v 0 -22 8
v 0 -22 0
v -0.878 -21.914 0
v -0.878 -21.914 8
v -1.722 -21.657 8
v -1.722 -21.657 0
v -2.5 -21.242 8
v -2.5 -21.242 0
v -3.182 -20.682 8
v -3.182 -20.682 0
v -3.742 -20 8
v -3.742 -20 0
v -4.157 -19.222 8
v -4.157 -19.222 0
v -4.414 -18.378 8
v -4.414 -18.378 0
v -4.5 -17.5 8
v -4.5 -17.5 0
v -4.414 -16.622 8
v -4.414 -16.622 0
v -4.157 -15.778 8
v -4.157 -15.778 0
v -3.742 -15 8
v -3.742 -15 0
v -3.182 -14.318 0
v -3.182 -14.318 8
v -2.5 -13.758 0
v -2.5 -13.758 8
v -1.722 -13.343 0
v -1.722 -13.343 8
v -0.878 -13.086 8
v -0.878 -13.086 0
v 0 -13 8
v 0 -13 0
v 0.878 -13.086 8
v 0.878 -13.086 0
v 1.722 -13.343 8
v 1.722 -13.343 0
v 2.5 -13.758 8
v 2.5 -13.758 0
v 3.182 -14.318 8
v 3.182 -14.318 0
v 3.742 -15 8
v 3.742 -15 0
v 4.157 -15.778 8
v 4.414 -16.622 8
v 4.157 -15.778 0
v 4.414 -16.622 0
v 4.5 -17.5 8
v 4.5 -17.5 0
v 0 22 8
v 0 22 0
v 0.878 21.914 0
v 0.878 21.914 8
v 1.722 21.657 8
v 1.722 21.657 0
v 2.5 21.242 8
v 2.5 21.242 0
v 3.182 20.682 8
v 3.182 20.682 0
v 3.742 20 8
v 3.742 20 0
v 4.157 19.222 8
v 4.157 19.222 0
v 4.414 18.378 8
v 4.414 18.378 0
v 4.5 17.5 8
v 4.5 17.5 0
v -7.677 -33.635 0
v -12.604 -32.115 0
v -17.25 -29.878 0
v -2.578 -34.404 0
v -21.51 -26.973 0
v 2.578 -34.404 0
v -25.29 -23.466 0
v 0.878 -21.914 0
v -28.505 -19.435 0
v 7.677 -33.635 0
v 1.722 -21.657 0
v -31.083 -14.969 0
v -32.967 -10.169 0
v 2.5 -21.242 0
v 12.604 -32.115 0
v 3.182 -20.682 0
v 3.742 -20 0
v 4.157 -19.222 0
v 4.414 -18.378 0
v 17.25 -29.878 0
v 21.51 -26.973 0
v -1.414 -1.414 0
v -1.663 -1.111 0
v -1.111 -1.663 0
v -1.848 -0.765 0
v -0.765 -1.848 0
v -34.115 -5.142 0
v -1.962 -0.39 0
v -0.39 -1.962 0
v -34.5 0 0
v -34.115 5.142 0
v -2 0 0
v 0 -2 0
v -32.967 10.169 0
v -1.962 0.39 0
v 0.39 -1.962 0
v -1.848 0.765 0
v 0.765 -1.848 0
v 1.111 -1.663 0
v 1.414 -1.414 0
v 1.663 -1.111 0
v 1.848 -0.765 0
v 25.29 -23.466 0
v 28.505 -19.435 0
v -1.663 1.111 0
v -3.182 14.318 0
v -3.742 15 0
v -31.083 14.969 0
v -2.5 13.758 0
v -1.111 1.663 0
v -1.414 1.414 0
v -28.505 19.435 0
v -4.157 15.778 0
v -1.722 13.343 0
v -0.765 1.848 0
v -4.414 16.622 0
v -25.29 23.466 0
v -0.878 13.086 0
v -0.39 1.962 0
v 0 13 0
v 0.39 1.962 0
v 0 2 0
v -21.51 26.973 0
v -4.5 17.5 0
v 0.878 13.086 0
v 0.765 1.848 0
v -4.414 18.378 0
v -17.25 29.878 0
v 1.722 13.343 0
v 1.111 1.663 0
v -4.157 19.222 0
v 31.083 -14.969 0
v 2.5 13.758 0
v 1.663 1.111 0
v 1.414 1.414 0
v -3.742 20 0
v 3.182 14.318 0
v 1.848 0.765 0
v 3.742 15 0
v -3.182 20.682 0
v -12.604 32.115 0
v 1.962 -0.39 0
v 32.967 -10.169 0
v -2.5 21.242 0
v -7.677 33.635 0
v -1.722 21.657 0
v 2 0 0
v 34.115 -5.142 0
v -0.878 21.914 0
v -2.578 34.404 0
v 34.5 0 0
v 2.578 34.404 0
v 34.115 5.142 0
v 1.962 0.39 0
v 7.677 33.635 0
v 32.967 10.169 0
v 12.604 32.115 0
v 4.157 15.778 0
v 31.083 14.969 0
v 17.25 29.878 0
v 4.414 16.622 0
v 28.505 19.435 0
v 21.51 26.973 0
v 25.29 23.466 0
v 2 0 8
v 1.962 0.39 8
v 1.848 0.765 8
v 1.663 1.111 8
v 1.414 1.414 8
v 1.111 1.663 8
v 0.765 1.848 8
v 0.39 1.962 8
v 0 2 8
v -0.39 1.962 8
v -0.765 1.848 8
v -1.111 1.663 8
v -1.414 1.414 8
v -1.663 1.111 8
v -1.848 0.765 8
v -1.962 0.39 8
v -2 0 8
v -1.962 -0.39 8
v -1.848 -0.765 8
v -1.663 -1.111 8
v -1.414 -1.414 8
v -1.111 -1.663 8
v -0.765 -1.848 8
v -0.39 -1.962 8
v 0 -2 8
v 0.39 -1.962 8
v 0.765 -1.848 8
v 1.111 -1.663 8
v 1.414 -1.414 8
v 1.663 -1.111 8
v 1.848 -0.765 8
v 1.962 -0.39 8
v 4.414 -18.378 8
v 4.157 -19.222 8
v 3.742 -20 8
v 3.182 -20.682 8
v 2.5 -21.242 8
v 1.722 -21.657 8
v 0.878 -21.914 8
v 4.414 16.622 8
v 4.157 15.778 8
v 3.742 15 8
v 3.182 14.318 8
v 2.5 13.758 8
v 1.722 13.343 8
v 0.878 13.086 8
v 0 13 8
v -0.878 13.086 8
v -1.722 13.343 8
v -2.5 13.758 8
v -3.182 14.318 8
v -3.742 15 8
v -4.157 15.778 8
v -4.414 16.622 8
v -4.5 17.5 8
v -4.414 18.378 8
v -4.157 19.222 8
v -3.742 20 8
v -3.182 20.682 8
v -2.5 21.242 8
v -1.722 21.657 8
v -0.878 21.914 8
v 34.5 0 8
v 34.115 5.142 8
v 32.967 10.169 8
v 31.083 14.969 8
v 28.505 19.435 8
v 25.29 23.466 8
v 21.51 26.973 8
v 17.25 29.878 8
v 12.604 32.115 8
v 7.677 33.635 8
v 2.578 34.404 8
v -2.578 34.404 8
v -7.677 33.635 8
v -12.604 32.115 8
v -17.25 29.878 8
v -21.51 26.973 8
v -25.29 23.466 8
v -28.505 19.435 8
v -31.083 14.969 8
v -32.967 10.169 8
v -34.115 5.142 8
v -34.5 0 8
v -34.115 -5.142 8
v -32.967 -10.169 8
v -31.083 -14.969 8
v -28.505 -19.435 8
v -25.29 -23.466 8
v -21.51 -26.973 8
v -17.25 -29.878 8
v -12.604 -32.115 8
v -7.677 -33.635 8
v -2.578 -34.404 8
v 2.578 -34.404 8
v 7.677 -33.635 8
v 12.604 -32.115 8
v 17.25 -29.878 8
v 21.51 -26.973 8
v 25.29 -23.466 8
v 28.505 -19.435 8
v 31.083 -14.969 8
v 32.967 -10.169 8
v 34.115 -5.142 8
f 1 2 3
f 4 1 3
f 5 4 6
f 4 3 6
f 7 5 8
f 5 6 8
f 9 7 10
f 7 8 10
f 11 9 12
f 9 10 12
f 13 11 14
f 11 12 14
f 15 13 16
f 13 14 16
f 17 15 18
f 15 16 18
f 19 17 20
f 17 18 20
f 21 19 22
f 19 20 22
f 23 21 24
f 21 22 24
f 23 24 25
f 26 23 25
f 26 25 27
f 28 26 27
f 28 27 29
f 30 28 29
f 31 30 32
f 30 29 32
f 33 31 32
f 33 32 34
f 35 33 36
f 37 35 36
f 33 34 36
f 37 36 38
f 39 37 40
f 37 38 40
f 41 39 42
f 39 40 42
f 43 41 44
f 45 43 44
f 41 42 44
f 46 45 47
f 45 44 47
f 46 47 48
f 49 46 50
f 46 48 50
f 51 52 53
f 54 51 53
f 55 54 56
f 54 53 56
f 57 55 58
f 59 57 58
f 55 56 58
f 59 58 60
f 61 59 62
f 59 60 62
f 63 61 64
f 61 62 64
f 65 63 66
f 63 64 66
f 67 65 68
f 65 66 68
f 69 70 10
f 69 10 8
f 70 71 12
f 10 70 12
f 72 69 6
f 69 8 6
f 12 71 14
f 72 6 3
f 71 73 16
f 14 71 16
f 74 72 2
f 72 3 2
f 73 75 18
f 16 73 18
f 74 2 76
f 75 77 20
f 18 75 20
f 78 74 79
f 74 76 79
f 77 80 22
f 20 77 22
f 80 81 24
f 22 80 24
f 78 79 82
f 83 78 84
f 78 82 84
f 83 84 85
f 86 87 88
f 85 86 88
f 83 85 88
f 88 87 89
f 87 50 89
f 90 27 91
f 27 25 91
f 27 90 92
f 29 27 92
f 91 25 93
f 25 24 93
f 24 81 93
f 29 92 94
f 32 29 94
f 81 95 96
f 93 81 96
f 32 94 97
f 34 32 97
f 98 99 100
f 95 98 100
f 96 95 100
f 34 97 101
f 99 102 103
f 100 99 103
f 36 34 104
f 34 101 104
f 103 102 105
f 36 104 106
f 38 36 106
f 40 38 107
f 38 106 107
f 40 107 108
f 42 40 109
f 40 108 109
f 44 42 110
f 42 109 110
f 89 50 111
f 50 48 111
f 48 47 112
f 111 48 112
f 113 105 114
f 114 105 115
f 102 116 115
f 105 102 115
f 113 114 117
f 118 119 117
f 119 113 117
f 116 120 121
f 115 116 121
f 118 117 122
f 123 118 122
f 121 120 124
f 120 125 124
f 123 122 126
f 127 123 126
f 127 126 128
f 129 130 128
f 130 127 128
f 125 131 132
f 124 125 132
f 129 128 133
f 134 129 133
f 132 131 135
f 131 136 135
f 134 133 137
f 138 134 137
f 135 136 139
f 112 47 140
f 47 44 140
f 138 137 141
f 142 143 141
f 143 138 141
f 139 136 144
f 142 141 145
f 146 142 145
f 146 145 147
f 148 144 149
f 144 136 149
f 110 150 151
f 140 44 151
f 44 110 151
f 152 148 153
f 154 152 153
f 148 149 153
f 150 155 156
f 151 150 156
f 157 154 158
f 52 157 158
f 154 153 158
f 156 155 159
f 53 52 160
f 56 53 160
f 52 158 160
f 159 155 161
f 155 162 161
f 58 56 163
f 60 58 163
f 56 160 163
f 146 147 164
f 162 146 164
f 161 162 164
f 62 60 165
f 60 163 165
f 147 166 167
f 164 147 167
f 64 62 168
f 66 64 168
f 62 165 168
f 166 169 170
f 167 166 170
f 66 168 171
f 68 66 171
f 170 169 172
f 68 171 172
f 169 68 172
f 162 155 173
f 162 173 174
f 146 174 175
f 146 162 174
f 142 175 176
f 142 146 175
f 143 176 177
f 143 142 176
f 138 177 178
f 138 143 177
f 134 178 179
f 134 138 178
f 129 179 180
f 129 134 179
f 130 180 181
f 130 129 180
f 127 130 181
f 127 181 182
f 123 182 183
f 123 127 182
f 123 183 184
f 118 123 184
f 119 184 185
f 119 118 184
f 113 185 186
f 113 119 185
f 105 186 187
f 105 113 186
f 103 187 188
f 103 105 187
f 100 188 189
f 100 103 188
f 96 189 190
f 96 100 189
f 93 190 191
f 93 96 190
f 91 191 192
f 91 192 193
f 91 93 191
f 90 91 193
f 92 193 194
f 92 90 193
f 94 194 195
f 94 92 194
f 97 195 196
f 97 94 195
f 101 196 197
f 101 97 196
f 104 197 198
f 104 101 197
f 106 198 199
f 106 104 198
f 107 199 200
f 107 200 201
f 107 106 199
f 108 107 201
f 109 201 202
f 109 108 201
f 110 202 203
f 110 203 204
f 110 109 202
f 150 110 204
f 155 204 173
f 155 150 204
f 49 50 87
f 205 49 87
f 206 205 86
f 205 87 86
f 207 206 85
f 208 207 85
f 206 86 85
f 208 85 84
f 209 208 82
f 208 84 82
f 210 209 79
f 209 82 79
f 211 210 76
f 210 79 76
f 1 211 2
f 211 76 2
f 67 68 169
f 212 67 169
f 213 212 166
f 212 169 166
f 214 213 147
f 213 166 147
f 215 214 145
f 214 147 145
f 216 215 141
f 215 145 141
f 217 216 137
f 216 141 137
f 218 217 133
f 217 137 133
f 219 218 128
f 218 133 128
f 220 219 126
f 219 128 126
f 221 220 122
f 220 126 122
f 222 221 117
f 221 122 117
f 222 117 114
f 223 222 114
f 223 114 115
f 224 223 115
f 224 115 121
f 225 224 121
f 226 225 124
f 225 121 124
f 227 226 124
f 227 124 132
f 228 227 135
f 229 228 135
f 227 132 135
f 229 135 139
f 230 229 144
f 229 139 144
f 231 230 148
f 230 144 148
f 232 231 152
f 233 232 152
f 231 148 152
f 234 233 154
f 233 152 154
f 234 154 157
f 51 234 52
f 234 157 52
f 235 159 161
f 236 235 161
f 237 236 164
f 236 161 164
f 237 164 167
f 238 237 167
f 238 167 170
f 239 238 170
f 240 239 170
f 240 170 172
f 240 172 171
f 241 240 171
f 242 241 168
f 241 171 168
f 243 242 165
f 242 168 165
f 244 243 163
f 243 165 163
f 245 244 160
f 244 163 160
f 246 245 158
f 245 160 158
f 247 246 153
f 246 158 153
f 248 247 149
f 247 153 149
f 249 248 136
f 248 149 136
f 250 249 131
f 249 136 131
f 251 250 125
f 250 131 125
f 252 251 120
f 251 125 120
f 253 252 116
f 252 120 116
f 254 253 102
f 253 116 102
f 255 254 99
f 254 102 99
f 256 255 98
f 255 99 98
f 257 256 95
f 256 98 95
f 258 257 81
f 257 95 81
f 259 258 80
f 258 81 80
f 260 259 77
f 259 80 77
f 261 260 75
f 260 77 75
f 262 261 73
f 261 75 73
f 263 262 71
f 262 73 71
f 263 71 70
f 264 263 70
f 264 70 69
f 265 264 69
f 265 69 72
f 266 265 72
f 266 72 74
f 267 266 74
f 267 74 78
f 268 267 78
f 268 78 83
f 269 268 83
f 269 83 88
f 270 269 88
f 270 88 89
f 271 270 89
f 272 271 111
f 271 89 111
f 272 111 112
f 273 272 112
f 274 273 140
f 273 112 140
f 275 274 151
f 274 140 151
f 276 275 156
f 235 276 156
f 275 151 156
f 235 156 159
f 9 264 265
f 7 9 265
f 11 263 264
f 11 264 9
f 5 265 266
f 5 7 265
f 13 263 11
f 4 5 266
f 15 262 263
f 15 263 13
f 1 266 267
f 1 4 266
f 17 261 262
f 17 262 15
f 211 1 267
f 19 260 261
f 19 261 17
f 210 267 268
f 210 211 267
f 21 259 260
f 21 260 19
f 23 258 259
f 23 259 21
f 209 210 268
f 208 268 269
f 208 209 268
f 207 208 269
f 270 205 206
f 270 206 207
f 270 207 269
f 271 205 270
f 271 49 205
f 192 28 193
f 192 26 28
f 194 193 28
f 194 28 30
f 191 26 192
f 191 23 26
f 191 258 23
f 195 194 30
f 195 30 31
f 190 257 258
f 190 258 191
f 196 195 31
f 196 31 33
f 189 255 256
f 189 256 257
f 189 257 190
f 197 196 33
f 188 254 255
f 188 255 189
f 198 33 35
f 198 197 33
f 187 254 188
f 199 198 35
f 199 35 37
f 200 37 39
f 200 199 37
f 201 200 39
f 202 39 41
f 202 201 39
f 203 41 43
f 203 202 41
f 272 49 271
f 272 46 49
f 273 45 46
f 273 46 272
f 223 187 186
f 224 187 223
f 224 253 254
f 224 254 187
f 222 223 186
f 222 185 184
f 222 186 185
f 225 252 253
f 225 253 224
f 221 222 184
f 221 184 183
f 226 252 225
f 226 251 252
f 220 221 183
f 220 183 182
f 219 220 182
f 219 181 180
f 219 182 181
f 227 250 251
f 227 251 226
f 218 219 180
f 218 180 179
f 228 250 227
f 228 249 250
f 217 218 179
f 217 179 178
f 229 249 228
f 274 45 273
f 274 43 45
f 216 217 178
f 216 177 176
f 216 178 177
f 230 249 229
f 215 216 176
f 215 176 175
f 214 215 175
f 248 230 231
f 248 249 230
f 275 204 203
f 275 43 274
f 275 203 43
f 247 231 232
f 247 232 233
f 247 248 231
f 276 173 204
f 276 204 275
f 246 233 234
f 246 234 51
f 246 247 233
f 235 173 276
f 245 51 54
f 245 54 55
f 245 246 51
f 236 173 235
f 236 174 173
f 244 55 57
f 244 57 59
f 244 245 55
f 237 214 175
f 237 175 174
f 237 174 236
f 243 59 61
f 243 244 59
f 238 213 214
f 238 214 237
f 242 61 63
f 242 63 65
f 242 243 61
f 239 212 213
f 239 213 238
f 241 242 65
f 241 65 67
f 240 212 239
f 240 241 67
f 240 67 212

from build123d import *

# Parameters (mm, degrees)
F0_R     = 34.5
F0_R_2   = 2
F1_DEPTH = 8


with BuildPart() as f1:
    # F0 (on Top) → F1 (new body)
    with BuildSketch(Plane.XY):
        Circle(F0_R)
        with BuildLine():
            ThreePointArc((0, 22), (15.5563491861, 15.5563491861), (22, 0))
            ThreePointArc((22, 0), (15.5563491861, -15.5563491861), (0, -22))
            ThreePointArc((0, -22), (-22, 0), (0, 22))
        make_face(mode=Mode.SUBTRACT)
        with BuildLine():
            ThreePointArc((0, -22), (15.5563491861, -15.5563491861), (22, 0))
            ThreePointArc((22, 0), (15.5563491861, 15.5563491861), (0, 22))
            ThreePointArc((0, 22), (-22, 0), (0, -22))
        make_face()
        with BuildLine():
            ThreePointArc((4.5, -17.5), (3.1819805153, -20.6819805153), (0, -22))
            ThreePointArc((0, -22), (-3.1819805153, -14.3180194847), (4.5, -17.5))
        make_face(mode=Mode.SUBTRACT)
        Circle(F0_R_2, mode=Mode.SUBTRACT)
        with BuildLine():
            ThreePointArc((4.5, 17.5), (-3.1819805153, 14.3180194847), (0, 22))
            ThreePointArc((0, 22), (3.1819805153, 20.6819805153), (4.5, 17.5))
        make_face(mode=Mode.SUBTRACT)
    extrude(amount=F1_DEPTH)


solid = f1.part
